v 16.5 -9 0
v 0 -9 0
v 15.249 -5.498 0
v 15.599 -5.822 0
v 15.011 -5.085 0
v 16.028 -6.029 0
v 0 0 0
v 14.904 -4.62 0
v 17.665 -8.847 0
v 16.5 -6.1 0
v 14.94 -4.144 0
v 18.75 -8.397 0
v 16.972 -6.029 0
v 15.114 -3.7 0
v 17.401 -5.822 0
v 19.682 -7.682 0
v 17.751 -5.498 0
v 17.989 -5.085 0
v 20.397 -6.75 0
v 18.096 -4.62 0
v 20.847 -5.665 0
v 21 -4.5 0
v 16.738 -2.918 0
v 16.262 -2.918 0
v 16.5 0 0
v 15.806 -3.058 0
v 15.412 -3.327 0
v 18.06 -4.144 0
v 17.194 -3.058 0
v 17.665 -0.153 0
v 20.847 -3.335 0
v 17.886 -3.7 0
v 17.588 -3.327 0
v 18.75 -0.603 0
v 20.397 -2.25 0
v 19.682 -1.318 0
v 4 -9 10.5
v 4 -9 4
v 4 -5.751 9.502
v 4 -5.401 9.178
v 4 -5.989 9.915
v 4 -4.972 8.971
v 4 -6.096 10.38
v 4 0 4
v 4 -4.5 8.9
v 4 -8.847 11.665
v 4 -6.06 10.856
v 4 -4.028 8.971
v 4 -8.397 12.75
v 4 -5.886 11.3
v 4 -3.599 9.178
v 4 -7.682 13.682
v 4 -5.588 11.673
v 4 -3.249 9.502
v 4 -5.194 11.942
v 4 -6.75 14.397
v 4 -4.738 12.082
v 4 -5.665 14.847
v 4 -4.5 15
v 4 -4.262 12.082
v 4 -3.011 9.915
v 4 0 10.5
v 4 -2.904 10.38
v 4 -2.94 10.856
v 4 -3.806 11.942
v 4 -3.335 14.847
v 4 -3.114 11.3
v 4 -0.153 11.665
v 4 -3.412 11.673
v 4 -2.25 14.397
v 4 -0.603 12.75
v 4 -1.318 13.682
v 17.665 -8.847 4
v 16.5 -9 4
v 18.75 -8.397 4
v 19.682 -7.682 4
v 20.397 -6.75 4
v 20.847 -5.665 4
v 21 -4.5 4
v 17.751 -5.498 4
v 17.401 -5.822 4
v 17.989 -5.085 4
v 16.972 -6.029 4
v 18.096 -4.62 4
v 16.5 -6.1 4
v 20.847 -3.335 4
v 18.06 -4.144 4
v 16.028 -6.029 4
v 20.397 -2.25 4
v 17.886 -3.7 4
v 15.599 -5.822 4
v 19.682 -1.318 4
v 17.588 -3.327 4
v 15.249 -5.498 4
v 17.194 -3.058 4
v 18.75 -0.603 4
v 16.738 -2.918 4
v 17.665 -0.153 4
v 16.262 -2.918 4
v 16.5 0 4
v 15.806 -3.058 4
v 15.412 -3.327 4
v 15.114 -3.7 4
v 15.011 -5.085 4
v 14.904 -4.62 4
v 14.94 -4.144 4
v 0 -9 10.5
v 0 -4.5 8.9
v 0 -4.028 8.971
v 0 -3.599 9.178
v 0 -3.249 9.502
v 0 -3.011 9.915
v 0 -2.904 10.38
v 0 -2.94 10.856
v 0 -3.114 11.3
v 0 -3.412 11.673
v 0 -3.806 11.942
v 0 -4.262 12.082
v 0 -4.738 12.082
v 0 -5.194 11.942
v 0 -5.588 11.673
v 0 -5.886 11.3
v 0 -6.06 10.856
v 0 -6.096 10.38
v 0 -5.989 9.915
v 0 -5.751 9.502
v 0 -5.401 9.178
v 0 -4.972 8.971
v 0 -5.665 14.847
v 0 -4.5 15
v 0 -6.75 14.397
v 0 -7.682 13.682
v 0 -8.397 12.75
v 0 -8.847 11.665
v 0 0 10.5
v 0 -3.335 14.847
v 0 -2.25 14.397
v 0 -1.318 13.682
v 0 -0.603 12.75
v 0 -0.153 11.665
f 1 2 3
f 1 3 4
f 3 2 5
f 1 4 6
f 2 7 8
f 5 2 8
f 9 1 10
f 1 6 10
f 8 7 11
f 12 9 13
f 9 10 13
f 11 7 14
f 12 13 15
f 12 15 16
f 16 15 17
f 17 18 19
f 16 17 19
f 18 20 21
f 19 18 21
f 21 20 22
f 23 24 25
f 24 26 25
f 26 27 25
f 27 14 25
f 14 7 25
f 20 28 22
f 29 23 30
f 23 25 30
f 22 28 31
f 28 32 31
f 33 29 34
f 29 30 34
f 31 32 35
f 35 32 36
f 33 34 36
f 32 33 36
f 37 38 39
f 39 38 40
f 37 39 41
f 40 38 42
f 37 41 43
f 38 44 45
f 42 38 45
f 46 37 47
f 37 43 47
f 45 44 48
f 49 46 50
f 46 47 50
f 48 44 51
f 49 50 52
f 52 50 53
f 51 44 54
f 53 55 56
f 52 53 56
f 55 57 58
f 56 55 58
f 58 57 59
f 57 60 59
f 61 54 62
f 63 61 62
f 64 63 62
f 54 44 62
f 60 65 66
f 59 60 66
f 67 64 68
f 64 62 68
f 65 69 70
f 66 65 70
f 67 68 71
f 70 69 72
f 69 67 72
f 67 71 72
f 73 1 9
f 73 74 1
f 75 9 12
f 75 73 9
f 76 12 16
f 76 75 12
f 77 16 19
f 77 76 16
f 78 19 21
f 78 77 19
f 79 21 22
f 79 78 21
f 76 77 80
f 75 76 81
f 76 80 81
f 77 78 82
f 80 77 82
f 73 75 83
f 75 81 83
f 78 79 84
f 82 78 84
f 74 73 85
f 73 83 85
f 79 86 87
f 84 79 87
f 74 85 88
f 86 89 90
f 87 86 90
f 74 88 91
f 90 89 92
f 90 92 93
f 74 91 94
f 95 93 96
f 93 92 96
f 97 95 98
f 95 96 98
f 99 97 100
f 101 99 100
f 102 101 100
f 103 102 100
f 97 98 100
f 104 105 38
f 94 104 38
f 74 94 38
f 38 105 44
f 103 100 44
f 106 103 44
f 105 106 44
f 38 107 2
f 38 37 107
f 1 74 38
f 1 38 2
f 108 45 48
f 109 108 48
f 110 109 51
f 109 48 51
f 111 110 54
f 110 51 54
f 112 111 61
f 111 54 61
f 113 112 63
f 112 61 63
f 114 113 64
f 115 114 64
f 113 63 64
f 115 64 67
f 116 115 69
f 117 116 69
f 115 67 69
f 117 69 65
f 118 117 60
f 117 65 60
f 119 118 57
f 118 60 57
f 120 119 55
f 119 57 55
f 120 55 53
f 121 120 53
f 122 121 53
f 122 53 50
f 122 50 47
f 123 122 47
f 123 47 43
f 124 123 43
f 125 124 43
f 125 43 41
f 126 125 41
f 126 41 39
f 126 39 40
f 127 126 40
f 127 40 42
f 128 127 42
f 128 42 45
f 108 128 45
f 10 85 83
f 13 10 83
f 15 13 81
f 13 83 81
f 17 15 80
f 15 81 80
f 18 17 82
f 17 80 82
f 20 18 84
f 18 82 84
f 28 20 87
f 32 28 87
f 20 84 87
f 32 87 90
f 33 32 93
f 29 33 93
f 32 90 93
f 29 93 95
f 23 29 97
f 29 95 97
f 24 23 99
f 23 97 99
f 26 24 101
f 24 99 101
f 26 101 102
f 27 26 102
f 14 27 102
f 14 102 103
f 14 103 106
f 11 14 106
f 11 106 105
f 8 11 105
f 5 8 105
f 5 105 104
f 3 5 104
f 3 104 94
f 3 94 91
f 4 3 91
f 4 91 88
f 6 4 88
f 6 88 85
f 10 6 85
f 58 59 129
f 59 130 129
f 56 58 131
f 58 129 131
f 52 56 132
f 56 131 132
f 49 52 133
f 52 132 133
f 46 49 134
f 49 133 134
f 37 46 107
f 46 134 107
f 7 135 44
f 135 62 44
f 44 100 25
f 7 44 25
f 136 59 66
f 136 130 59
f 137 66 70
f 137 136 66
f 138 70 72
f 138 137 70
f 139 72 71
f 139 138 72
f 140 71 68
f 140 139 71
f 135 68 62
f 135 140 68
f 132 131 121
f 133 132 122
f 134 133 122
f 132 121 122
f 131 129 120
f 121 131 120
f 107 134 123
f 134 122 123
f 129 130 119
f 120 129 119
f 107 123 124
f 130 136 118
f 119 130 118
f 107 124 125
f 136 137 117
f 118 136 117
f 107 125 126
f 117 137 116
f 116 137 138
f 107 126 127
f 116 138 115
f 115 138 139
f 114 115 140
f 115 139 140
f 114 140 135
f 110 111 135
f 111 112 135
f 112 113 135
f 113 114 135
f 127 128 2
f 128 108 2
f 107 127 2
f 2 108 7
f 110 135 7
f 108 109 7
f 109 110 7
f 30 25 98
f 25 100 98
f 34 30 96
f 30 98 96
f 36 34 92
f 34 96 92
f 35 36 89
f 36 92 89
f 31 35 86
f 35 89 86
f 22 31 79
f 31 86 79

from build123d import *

# Parameters (mm, degrees)
F1_DEPTH = 9
F2_R     = 1.6
F3_DEPTH = 25
F4_R     = 1.6
F5_DEPTH = 25
F6_R     = 4.49999
F7_ANGLE = 90


# Not quite as in the source:
# - a fillet or chamfer is up to 0.001 mm smaller than in the source, because OpenCascade refuses the exact size


with BuildPart() as f1:
    # F0 (on Front) → F1 (new body)
    with BuildSketch(Plane.XZ):
        Polygon((-15, 4), (-15, 0), (0, 0), (0, 21), (-4, 21), (-4, 4), align=None)
    extrude(amount=F1_DEPTH)

    # F2 (on face) → F3 (cut)
    with BuildSketch(Plane.XY.offset(4)):
        with Locations((-10.5, -4.5)):
            Circle(F2_R)
    extrude(amount=-F3_DEPTH, mode=Mode.SUBTRACT)

    # F4 (on face) → F5 (cut)
    with BuildSketch(Plane(origin=(-4, 0, 0), x_dir=(0, -1, 0), z_dir=(-1, 0, 0))):
        with Locations((4.5, 16.5)):
            Circle(F4_R)
    extrude(amount=-F5_DEPTH, mode=Mode.SUBTRACT)

    # F6 (radius 4.5 in the source; OpenCascade refuses exactly that, so slightly less here)
    f6_edges = [f1.edges().sort_by_distance(p)[0] for p in [
        (-2, -9, 21),
        (-2, 0, 21),
        (-15, 0, 2),
        (-15, -9, 2),
    ]]
    fillet(f6_edges, radius=F6_R)


with BuildPart() as f1_1:
    # F7: moved
    add(f1.part.rotate(Axis((0, -4.5, 0), (0, 1, 0)), F7_ANGLE))


solid = f1_1.part
